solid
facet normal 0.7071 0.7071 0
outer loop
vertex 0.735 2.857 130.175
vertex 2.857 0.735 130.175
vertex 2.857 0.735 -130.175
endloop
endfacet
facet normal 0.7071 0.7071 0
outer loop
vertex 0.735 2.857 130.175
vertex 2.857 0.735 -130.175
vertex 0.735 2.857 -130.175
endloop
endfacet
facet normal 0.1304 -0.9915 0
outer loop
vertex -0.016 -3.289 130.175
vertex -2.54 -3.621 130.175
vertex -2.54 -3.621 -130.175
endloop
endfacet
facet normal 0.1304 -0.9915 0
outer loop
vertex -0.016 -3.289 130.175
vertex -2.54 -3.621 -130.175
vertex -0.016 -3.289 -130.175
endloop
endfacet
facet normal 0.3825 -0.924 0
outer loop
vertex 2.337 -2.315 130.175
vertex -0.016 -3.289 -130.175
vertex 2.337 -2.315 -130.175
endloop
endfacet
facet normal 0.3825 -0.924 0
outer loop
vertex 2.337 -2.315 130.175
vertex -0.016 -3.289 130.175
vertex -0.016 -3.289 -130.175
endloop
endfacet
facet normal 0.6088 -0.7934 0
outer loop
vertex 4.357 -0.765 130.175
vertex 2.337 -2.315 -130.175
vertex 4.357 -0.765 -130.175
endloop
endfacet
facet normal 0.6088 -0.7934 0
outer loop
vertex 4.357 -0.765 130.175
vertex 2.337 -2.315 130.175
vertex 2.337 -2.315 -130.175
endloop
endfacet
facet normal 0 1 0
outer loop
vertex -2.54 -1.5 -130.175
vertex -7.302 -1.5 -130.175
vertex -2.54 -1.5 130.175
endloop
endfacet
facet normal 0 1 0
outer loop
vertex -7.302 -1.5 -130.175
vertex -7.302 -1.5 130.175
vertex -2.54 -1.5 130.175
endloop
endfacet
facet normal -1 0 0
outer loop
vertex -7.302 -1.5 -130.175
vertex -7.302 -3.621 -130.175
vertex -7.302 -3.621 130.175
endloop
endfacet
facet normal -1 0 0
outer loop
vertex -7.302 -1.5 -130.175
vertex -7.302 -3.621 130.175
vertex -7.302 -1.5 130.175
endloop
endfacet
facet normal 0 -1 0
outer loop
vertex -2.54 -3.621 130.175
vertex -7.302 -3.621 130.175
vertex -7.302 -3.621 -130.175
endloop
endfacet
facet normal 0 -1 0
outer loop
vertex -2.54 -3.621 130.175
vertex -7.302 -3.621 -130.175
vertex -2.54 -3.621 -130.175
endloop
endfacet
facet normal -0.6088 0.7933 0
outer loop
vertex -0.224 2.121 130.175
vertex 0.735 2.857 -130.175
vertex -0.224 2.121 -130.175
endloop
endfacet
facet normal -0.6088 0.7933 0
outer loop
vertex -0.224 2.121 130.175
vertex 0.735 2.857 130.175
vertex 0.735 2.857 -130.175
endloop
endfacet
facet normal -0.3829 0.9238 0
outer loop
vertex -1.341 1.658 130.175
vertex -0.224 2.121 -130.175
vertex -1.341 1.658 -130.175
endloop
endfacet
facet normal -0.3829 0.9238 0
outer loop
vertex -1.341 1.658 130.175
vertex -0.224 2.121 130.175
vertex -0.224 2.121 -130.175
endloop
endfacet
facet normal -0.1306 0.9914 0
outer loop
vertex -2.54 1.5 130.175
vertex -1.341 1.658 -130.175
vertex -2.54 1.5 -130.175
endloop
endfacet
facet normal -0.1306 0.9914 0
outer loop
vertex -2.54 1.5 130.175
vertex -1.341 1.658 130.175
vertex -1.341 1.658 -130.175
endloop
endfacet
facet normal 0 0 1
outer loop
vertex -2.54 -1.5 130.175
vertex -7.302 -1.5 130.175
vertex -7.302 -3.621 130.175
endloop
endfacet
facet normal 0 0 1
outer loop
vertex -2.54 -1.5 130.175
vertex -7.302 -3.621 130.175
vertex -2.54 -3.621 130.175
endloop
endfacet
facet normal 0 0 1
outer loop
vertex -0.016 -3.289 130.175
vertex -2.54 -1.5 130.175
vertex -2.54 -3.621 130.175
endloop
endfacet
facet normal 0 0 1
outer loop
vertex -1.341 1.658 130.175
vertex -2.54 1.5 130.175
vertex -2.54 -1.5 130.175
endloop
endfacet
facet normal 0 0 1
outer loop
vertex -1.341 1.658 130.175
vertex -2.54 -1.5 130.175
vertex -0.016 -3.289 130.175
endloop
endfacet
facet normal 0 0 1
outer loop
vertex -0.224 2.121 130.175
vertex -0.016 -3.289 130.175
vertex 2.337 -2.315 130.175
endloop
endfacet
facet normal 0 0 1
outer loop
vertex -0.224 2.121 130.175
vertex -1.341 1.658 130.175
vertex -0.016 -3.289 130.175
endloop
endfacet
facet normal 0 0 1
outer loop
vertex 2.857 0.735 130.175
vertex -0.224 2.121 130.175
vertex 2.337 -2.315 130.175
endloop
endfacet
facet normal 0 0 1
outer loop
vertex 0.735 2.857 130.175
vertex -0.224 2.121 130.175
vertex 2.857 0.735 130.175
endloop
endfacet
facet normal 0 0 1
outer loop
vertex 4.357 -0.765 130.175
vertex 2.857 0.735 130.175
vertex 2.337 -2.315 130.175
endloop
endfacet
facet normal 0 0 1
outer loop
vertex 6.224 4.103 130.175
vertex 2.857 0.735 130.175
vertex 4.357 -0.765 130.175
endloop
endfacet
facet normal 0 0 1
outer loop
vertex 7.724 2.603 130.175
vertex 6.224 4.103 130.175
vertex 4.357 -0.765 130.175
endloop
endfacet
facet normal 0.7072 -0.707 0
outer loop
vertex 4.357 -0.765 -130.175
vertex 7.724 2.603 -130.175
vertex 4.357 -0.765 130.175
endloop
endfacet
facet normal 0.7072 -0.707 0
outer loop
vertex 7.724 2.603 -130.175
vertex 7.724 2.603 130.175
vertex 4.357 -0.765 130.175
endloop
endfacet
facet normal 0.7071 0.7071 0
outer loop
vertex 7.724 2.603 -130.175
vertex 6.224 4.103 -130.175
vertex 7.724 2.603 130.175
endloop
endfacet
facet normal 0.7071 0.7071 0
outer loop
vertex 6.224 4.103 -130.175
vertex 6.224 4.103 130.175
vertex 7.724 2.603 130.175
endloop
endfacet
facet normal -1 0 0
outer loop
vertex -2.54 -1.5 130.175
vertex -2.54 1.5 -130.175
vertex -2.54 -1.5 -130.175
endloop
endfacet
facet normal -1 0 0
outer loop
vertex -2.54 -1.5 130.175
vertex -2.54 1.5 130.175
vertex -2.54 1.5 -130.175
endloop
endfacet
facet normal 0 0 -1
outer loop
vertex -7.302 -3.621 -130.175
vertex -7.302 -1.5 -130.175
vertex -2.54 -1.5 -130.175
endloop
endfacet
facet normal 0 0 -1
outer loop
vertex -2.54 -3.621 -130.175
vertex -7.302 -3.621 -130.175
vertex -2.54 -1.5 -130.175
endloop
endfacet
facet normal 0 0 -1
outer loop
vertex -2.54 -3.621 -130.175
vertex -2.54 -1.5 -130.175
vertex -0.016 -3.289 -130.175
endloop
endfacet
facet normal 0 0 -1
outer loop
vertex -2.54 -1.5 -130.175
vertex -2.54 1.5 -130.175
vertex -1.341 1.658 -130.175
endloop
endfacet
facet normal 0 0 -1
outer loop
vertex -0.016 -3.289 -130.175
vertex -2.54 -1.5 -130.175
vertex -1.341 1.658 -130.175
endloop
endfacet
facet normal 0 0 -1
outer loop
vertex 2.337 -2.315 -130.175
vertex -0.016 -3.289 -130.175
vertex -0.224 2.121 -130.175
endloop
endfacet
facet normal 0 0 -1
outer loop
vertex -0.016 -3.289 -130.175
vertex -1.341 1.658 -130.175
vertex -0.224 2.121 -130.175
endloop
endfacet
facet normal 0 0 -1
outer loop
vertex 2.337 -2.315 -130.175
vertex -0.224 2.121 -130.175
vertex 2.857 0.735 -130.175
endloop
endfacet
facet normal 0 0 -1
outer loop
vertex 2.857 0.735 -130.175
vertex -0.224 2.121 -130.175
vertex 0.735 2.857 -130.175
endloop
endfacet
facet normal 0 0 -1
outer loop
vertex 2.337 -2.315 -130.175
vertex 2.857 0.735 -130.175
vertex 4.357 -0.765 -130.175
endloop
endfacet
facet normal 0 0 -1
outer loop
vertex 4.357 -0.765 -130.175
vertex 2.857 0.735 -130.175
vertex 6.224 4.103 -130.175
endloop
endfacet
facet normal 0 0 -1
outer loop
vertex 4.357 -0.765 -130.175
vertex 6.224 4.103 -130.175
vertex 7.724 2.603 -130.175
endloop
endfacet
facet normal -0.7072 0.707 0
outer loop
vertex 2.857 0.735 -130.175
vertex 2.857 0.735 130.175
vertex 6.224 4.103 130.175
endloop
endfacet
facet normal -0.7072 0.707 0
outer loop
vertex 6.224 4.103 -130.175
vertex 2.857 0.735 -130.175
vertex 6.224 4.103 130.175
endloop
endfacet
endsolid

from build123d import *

# Parameters (mm, degrees)
SKETCH7_W           = 4.7625
SKETCH7_H           = 2.12122512
BOSS_EXTRUDE2_DEPTH = 130.175
BOSS_EXTRUDE3_DEPTH = 130.175
BOSS_EXTRUDE4_DEPTH = 130.175


with BuildPart() as part:
    # Sketch7 → Boss-Extrude2 (new, symmetric)
    with BuildSketch(Plane.XY):
        with Locations((-4.92125, -2.560612608)):
            Rectangle(SKETCH7_W, SKETCH7_H)
    extrude(amount=BOSS_EXTRUDE2_DEPTH, both=True)



with BuildPart() as body_2:
    # Sketch8 → Boss-Extrude3 (new, symmetric)
    with BuildSketch(Plane.XY):
        Polygon((2.85671143, 0.735391018), (6.224307475, 4.102987064), (7.724240142, 2.603054397), (4.356644097, -0.764541648), align=None)
    extrude(amount=BOSS_EXTRUDE3_DEPTH, both=True)


with BuildPart() as part_1:
    add(part.part)

    add(body_2.part)  # Boss-Extrude4 merges body 2
    # Sketch11 → Boss-Extrude4 (add, symmetric)
    with BuildSketch(Plane.XY):
        with BuildLine():
            Line((-2.54, -1.500000048), (-7.3025, -1.500000048))
            Line((-7.3025, -1.500000048), (-7.3025, -3.621225168))
            Line((-7.3025, -3.621225168), (-2.54, -3.621225168))
            ThreePointArc((-2.54, -3.621225168), (1.192436889, -2.87879731), (4.356644097, -0.764541648))
            Line((4.356644097, -0.764541648), (7.724240142, 2.603054397))
            Line((7.724240142, 2.603054397), (6.224307475, 4.102987064))
            Line((6.224307475, 4.102987064), (2.85671143, 0.735391018))
            Line((2.85671143, 0.735391018), (0.735391018, 2.85671143))
            ThreePointArc((0.735391018, 2.85671143), (-0.767371154, 1.852597848), (-2.54, 1.500000048))
            Line((-2.54, 1.500000048), (-2.54, -1.500000048))
        make_face()
    extrude(amount=BOSS_EXTRUDE4_DEPTH, both=True)


solid = part_1.part
